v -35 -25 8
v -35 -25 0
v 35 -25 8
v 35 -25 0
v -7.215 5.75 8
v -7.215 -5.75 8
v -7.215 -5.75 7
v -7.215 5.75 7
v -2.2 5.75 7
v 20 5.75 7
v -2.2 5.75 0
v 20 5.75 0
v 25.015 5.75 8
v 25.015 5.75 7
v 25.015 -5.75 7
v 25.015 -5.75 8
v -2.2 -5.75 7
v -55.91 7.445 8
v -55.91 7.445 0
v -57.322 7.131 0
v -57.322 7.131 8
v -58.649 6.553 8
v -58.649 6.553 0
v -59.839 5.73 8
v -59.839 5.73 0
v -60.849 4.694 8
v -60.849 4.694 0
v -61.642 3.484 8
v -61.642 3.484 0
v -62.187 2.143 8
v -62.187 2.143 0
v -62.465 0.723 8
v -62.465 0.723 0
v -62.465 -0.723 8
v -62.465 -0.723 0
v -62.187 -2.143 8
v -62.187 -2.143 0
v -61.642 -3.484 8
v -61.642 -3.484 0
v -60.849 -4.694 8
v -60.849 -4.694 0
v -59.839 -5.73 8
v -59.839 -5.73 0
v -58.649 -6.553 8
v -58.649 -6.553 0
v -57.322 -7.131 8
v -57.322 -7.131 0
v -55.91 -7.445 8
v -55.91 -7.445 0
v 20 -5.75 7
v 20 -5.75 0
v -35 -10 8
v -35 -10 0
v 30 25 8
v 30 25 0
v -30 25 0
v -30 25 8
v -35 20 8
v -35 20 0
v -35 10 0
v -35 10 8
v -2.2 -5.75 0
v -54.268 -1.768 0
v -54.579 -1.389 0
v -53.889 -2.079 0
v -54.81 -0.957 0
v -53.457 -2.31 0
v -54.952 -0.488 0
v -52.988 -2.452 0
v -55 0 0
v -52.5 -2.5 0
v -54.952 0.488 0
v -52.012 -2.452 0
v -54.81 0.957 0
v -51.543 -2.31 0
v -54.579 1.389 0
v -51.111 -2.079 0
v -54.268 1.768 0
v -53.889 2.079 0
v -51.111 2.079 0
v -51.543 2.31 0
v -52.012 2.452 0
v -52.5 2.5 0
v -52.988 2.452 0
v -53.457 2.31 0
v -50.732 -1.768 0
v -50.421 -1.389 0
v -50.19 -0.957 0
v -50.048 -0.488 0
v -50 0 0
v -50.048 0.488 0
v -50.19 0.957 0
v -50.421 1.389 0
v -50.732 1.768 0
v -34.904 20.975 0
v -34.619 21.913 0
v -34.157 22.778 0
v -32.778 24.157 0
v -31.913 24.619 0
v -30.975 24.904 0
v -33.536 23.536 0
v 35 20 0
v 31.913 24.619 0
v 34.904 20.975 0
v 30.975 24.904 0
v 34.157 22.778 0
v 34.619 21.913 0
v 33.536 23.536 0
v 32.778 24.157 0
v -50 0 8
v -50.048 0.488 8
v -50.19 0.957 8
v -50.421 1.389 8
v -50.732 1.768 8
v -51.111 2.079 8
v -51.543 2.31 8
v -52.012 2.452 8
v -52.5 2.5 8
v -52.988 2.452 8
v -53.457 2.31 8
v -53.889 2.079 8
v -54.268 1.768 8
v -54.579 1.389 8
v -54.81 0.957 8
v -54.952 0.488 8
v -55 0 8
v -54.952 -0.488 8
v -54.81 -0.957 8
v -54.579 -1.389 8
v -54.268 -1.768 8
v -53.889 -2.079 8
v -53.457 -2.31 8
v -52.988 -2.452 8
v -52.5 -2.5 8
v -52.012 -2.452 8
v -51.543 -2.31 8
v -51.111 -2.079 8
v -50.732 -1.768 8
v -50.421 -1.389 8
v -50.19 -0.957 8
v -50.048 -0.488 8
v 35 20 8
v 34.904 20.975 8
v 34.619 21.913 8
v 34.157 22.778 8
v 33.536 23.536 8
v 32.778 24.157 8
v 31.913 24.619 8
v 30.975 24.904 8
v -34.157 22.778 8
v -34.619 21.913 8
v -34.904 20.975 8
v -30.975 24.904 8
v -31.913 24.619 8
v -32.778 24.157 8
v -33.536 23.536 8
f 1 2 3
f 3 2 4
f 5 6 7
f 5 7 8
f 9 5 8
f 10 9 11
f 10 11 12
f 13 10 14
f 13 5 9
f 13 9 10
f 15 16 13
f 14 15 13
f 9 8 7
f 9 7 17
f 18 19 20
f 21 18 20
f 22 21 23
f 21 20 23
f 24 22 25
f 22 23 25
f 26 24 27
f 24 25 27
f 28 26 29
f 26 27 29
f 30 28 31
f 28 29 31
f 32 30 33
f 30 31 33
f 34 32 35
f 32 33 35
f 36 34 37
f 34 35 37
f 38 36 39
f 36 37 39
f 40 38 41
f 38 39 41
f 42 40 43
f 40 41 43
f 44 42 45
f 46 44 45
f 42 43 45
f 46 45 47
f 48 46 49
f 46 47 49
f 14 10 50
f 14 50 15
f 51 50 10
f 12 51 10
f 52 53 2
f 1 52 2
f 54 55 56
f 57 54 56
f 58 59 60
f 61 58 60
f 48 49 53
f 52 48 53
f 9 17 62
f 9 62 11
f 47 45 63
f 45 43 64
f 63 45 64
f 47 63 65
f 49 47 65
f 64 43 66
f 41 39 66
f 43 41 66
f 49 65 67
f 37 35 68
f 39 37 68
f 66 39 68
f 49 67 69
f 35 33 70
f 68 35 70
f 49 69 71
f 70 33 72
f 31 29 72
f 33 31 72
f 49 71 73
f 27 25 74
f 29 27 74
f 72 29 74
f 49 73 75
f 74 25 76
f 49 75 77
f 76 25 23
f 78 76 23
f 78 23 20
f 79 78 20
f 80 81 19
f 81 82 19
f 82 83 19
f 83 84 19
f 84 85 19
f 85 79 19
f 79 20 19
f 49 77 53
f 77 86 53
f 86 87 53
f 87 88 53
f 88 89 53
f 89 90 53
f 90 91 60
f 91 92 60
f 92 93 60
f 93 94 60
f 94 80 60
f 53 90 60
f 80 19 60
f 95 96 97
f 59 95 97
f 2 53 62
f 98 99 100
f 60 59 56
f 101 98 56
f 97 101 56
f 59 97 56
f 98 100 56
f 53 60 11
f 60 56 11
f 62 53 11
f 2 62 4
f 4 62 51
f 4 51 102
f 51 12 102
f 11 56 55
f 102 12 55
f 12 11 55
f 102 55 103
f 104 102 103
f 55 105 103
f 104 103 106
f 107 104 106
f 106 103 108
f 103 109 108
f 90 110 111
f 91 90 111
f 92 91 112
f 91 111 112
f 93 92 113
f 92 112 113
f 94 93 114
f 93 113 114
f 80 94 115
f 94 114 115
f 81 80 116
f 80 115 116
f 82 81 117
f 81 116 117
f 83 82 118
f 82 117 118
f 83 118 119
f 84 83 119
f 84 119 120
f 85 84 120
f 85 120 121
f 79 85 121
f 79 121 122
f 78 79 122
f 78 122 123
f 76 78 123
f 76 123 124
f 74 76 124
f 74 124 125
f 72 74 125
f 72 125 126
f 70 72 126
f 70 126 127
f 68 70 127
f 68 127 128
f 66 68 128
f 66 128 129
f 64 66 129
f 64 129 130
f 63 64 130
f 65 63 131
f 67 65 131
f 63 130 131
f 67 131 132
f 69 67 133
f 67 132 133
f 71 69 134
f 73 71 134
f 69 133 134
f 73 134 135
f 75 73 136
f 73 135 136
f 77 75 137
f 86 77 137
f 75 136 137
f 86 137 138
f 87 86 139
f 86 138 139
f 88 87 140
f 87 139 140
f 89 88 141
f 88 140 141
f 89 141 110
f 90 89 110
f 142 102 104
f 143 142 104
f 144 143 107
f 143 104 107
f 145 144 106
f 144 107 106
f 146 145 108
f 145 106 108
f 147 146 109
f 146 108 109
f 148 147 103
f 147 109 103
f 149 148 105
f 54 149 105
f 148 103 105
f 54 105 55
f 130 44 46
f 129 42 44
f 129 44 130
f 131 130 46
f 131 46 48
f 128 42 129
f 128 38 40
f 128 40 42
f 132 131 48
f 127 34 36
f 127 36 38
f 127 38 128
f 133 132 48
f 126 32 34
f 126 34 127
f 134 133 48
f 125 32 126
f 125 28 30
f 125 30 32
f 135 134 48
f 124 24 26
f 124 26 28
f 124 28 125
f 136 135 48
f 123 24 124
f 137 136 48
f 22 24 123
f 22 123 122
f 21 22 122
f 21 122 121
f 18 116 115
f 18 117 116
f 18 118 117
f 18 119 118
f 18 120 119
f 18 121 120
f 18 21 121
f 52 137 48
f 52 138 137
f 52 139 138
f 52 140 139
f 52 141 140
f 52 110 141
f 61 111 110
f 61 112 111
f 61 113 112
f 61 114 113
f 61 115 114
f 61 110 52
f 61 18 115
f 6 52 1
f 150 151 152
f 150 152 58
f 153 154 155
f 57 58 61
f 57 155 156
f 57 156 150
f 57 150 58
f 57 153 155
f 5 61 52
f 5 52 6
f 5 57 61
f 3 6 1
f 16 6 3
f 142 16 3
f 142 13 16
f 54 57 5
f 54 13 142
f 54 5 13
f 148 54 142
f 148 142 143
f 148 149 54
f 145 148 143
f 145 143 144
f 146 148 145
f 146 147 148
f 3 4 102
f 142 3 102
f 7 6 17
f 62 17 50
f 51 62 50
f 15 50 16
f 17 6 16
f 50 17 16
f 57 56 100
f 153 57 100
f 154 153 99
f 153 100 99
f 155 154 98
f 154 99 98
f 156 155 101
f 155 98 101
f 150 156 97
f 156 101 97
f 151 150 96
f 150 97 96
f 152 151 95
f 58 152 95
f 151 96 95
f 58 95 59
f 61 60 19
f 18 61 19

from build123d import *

# Parameters (mm, degrees)
BOSS_EXTRUDE1_DEPTH = 8
SKETCH3_W           = 22.2
SKETCH3_H           = 11.5
CUT_EXTRUDE1_DEPTH  = 8
SKETCH4_R           = 2.5
CUT_EXTRUDE2_DEPTH  = 20
SKETCH6_W           = 5.014738262
SKETCH6_H           = 11.5
CUT_EXTRUDE3_DEPTH  = 1


with BuildPart() as part:
    # Sketch1 → Boss-Extrude1 (new body)
    with BuildSketch(Plane.XY):
        with BuildLine():
            Line((-35, 20), (-35, 10))
            Line((-35, 10), (-55.909806165, 7.44461233))
            ThreePointArc((-55.909806165, 7.44461233), (-50.028760026, 5.615761134), (-47.5, 0))
            ThreePointArc((-47.5, 0), (-50.028760026, -5.615761134), (-55.909806165, -7.44461233))
            Line((-55.909806165, -7.44461233), (-35, -10))
            Line((-35, -10), (-35, -25))
            Line((-35, -25), (35, -25))
            Line((35, -25), (35, 20))
            ThreePointArc((35, 20), (33.535533906, 23.535533906), (30, 25))
            Line((30, 25), (-30, 25))
            ThreePointArc((-30, 25), (-33.535533906, 23.535533906), (-35, 20))
        make_face()
        with BuildLine():
            ThreePointArc((-47.5, 0), (-50.028760026, 5.615761134), (-55.909806165, 7.44461233))
            ThreePointArc((-55.909806165, 7.44461233), (-62.5, 0), (-55.909806165, -7.44461233))
            ThreePointArc((-55.909806165, -7.44461233), (-50.028760026, -5.615761134), (-47.5, 0))
        make_face()
    extrude(amount=BOSS_EXTRUDE1_DEPTH)

    # Sketch3 → Cut-Extrude1 (cut)
    with BuildSketch(Plane.XY.offset(8)):
        with Locations((8.9, 0)):
            Rectangle(SKETCH3_W, SKETCH3_H)
    extrude(amount=-CUT_EXTRUDE1_DEPTH, mode=Mode.SUBTRACT)

    # Sketch4 → Cut-Extrude2 (cut)
    with BuildSketch(Plane.XY.offset(8)):
        with Locations((-52.5, 0)):
            Circle(SKETCH4_R)
    extrude(amount=-CUT_EXTRUDE2_DEPTH, mode=Mode.SUBTRACT)

    # Sketch6 → Cut-Extrude3 (cut)
    with BuildSketch(Plane.XY.offset(8)):
        with Locations((-4.707369131, 0)):
            Rectangle(SKETCH6_W, SKETCH6_H)
        with Locations((22.507369131, 0)):
            Rectangle(SKETCH6_W, SKETCH6_H)
    extrude(amount=-CUT_EXTRUDE3_DEPTH, mode=Mode.SUBTRACT)


solid = part.part
